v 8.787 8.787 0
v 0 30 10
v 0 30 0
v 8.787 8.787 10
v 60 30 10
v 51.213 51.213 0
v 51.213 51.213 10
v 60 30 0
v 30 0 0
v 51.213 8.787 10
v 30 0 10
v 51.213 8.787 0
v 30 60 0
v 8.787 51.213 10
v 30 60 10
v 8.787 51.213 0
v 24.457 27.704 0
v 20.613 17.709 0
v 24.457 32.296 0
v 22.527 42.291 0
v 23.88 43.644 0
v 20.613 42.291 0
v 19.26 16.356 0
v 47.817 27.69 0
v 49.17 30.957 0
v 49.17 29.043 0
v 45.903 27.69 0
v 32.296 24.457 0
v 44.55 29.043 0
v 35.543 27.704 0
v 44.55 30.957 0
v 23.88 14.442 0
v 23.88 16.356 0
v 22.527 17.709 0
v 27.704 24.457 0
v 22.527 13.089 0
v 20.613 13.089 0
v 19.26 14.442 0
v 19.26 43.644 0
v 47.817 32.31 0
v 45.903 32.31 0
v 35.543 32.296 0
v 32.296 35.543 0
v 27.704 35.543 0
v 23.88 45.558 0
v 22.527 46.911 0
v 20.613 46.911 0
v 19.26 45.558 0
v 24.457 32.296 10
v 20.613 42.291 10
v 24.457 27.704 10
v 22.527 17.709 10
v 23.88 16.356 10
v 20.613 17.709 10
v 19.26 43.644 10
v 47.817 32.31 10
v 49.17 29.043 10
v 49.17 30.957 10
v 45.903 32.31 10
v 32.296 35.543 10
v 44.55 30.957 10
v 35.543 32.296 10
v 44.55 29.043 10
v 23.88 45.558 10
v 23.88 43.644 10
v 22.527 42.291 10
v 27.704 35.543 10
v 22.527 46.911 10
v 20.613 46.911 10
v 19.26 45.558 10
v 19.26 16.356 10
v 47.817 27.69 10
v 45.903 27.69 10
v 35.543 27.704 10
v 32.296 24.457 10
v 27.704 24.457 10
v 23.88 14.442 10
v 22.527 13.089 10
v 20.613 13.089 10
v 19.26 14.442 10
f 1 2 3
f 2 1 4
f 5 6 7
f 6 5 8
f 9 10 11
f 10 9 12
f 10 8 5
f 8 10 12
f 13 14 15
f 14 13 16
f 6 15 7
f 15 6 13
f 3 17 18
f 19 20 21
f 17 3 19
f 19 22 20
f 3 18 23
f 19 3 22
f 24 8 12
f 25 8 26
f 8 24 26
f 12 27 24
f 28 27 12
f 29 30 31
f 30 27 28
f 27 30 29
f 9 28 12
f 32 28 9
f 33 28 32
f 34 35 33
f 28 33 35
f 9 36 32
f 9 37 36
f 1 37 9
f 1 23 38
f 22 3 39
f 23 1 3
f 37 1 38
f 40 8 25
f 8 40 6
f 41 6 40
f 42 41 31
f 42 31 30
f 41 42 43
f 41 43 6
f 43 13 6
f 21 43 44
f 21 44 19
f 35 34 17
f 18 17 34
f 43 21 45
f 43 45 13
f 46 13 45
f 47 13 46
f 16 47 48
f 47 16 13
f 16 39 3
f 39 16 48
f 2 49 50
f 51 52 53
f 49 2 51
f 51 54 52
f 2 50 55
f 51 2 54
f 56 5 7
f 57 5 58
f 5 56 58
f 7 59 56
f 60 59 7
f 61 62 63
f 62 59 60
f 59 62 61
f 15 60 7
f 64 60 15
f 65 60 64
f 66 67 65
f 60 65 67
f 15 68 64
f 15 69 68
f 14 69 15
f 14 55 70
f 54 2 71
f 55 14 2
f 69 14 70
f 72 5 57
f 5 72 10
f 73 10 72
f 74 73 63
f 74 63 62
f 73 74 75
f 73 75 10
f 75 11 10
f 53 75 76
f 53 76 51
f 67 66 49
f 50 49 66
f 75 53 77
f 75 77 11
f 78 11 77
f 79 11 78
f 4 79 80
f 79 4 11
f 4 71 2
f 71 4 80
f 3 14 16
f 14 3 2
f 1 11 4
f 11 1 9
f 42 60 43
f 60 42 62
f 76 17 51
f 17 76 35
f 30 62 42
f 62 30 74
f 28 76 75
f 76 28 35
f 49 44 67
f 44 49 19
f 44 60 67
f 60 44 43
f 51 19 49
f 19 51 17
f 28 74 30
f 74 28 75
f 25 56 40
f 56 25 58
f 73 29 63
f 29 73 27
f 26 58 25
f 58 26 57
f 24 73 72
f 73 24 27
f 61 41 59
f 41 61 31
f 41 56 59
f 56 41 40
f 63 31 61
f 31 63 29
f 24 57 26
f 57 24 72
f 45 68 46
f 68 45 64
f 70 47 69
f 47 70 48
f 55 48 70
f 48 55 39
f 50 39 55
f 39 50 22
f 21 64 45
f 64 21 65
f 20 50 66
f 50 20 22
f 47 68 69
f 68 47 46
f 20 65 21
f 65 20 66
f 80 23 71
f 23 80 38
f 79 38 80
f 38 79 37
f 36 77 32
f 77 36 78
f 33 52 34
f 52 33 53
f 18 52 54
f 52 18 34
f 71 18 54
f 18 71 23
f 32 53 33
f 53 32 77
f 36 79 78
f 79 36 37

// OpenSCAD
$fn = 32;

// ----------------------------------------------------------------------
// Polygon plate: 8-gon R30, 3 bolt windows
// ----------------------------------------------------------------------

// --- parameters (mm) ---
sides = 8;                // number of polygon sides
plate_r = 30;             // circumscribed radius of the polygon
bore_r = 6;               // centre bore radius
bolts = 3;                // number of bolt windows
ring_r = 16.86;           // bolt-circle radius
bolt_r = 2.5;             // bolt window radius
plate_t = 10;             // plate thickness, Z (extrusion height)
fit_tol = 0.02;           // declared fit tolerance (prompt contract)
free_tol = 0.2;           // declared free tolerance (prompt contract)

plate_d = 2 * plate_r;  // circumscribed diameter
bore_d = 2 * bore_r;  // centre bore diameter
bolt_d = 2 * bolt_r;  // bolt window diameter
ring_d = 2 * ring_r;  // bolt-circle diameter

profile = [[60, 30], [51.213, 51.213], [30, 60], [8.787, 51.213], [0, 30], [8.787, 8.787], [30, 0], [51.213, 8.787]];  // primary outline, 8 points, counter clockwise
void_1 = [[35.543, 32.296], [32.296, 35.543], [27.704, 35.543], [24.457, 32.296], [24.457, 27.704], [27.704, 24.457], [32.296, 24.457], [35.543, 27.704]];  // centre bore, 8 points
void_2 = [[49.17, 30.957], [47.817, 32.31], [45.903, 32.31], [44.55, 30.957], [44.55, 29.043], [45.903, 27.69], [47.817, 27.69], [49.17, 29.043]];  // bolt window 1, 8 points
void_3 = [[23.88, 45.558], [22.527, 46.911], [20.613, 46.911], [19.26, 45.558], [19.26, 43.644], [20.613, 42.291], [22.527, 42.291], [23.88, 43.644]];  // bolt window 2, 8 points
void_4 = [[23.88, 16.356], [22.527, 17.709], [20.613, 17.709], [19.26, 16.356], [19.26, 14.442], [20.613, 13.089], [22.527, 13.089], [23.88, 14.442]];  // bolt window 3, 8 points

// --- the one profile operation ---
difference() {
  linear_extrude(height = plate_t) polygon(points = profile);
  translate([0, 0, -1])
    linear_extrude(height = plate_t + 2) polygon(points = void_1);
  translate([0, 0, -1])
    linear_extrude(height = plate_t + 2) polygon(points = void_2);
  translate([0, 0, -1])
    linear_extrude(height = plate_t + 2) polygon(points = void_3);
  translate([0, 0, -1])
    linear_extrude(height = plate_t + 2) polygon(points = void_4);
}
